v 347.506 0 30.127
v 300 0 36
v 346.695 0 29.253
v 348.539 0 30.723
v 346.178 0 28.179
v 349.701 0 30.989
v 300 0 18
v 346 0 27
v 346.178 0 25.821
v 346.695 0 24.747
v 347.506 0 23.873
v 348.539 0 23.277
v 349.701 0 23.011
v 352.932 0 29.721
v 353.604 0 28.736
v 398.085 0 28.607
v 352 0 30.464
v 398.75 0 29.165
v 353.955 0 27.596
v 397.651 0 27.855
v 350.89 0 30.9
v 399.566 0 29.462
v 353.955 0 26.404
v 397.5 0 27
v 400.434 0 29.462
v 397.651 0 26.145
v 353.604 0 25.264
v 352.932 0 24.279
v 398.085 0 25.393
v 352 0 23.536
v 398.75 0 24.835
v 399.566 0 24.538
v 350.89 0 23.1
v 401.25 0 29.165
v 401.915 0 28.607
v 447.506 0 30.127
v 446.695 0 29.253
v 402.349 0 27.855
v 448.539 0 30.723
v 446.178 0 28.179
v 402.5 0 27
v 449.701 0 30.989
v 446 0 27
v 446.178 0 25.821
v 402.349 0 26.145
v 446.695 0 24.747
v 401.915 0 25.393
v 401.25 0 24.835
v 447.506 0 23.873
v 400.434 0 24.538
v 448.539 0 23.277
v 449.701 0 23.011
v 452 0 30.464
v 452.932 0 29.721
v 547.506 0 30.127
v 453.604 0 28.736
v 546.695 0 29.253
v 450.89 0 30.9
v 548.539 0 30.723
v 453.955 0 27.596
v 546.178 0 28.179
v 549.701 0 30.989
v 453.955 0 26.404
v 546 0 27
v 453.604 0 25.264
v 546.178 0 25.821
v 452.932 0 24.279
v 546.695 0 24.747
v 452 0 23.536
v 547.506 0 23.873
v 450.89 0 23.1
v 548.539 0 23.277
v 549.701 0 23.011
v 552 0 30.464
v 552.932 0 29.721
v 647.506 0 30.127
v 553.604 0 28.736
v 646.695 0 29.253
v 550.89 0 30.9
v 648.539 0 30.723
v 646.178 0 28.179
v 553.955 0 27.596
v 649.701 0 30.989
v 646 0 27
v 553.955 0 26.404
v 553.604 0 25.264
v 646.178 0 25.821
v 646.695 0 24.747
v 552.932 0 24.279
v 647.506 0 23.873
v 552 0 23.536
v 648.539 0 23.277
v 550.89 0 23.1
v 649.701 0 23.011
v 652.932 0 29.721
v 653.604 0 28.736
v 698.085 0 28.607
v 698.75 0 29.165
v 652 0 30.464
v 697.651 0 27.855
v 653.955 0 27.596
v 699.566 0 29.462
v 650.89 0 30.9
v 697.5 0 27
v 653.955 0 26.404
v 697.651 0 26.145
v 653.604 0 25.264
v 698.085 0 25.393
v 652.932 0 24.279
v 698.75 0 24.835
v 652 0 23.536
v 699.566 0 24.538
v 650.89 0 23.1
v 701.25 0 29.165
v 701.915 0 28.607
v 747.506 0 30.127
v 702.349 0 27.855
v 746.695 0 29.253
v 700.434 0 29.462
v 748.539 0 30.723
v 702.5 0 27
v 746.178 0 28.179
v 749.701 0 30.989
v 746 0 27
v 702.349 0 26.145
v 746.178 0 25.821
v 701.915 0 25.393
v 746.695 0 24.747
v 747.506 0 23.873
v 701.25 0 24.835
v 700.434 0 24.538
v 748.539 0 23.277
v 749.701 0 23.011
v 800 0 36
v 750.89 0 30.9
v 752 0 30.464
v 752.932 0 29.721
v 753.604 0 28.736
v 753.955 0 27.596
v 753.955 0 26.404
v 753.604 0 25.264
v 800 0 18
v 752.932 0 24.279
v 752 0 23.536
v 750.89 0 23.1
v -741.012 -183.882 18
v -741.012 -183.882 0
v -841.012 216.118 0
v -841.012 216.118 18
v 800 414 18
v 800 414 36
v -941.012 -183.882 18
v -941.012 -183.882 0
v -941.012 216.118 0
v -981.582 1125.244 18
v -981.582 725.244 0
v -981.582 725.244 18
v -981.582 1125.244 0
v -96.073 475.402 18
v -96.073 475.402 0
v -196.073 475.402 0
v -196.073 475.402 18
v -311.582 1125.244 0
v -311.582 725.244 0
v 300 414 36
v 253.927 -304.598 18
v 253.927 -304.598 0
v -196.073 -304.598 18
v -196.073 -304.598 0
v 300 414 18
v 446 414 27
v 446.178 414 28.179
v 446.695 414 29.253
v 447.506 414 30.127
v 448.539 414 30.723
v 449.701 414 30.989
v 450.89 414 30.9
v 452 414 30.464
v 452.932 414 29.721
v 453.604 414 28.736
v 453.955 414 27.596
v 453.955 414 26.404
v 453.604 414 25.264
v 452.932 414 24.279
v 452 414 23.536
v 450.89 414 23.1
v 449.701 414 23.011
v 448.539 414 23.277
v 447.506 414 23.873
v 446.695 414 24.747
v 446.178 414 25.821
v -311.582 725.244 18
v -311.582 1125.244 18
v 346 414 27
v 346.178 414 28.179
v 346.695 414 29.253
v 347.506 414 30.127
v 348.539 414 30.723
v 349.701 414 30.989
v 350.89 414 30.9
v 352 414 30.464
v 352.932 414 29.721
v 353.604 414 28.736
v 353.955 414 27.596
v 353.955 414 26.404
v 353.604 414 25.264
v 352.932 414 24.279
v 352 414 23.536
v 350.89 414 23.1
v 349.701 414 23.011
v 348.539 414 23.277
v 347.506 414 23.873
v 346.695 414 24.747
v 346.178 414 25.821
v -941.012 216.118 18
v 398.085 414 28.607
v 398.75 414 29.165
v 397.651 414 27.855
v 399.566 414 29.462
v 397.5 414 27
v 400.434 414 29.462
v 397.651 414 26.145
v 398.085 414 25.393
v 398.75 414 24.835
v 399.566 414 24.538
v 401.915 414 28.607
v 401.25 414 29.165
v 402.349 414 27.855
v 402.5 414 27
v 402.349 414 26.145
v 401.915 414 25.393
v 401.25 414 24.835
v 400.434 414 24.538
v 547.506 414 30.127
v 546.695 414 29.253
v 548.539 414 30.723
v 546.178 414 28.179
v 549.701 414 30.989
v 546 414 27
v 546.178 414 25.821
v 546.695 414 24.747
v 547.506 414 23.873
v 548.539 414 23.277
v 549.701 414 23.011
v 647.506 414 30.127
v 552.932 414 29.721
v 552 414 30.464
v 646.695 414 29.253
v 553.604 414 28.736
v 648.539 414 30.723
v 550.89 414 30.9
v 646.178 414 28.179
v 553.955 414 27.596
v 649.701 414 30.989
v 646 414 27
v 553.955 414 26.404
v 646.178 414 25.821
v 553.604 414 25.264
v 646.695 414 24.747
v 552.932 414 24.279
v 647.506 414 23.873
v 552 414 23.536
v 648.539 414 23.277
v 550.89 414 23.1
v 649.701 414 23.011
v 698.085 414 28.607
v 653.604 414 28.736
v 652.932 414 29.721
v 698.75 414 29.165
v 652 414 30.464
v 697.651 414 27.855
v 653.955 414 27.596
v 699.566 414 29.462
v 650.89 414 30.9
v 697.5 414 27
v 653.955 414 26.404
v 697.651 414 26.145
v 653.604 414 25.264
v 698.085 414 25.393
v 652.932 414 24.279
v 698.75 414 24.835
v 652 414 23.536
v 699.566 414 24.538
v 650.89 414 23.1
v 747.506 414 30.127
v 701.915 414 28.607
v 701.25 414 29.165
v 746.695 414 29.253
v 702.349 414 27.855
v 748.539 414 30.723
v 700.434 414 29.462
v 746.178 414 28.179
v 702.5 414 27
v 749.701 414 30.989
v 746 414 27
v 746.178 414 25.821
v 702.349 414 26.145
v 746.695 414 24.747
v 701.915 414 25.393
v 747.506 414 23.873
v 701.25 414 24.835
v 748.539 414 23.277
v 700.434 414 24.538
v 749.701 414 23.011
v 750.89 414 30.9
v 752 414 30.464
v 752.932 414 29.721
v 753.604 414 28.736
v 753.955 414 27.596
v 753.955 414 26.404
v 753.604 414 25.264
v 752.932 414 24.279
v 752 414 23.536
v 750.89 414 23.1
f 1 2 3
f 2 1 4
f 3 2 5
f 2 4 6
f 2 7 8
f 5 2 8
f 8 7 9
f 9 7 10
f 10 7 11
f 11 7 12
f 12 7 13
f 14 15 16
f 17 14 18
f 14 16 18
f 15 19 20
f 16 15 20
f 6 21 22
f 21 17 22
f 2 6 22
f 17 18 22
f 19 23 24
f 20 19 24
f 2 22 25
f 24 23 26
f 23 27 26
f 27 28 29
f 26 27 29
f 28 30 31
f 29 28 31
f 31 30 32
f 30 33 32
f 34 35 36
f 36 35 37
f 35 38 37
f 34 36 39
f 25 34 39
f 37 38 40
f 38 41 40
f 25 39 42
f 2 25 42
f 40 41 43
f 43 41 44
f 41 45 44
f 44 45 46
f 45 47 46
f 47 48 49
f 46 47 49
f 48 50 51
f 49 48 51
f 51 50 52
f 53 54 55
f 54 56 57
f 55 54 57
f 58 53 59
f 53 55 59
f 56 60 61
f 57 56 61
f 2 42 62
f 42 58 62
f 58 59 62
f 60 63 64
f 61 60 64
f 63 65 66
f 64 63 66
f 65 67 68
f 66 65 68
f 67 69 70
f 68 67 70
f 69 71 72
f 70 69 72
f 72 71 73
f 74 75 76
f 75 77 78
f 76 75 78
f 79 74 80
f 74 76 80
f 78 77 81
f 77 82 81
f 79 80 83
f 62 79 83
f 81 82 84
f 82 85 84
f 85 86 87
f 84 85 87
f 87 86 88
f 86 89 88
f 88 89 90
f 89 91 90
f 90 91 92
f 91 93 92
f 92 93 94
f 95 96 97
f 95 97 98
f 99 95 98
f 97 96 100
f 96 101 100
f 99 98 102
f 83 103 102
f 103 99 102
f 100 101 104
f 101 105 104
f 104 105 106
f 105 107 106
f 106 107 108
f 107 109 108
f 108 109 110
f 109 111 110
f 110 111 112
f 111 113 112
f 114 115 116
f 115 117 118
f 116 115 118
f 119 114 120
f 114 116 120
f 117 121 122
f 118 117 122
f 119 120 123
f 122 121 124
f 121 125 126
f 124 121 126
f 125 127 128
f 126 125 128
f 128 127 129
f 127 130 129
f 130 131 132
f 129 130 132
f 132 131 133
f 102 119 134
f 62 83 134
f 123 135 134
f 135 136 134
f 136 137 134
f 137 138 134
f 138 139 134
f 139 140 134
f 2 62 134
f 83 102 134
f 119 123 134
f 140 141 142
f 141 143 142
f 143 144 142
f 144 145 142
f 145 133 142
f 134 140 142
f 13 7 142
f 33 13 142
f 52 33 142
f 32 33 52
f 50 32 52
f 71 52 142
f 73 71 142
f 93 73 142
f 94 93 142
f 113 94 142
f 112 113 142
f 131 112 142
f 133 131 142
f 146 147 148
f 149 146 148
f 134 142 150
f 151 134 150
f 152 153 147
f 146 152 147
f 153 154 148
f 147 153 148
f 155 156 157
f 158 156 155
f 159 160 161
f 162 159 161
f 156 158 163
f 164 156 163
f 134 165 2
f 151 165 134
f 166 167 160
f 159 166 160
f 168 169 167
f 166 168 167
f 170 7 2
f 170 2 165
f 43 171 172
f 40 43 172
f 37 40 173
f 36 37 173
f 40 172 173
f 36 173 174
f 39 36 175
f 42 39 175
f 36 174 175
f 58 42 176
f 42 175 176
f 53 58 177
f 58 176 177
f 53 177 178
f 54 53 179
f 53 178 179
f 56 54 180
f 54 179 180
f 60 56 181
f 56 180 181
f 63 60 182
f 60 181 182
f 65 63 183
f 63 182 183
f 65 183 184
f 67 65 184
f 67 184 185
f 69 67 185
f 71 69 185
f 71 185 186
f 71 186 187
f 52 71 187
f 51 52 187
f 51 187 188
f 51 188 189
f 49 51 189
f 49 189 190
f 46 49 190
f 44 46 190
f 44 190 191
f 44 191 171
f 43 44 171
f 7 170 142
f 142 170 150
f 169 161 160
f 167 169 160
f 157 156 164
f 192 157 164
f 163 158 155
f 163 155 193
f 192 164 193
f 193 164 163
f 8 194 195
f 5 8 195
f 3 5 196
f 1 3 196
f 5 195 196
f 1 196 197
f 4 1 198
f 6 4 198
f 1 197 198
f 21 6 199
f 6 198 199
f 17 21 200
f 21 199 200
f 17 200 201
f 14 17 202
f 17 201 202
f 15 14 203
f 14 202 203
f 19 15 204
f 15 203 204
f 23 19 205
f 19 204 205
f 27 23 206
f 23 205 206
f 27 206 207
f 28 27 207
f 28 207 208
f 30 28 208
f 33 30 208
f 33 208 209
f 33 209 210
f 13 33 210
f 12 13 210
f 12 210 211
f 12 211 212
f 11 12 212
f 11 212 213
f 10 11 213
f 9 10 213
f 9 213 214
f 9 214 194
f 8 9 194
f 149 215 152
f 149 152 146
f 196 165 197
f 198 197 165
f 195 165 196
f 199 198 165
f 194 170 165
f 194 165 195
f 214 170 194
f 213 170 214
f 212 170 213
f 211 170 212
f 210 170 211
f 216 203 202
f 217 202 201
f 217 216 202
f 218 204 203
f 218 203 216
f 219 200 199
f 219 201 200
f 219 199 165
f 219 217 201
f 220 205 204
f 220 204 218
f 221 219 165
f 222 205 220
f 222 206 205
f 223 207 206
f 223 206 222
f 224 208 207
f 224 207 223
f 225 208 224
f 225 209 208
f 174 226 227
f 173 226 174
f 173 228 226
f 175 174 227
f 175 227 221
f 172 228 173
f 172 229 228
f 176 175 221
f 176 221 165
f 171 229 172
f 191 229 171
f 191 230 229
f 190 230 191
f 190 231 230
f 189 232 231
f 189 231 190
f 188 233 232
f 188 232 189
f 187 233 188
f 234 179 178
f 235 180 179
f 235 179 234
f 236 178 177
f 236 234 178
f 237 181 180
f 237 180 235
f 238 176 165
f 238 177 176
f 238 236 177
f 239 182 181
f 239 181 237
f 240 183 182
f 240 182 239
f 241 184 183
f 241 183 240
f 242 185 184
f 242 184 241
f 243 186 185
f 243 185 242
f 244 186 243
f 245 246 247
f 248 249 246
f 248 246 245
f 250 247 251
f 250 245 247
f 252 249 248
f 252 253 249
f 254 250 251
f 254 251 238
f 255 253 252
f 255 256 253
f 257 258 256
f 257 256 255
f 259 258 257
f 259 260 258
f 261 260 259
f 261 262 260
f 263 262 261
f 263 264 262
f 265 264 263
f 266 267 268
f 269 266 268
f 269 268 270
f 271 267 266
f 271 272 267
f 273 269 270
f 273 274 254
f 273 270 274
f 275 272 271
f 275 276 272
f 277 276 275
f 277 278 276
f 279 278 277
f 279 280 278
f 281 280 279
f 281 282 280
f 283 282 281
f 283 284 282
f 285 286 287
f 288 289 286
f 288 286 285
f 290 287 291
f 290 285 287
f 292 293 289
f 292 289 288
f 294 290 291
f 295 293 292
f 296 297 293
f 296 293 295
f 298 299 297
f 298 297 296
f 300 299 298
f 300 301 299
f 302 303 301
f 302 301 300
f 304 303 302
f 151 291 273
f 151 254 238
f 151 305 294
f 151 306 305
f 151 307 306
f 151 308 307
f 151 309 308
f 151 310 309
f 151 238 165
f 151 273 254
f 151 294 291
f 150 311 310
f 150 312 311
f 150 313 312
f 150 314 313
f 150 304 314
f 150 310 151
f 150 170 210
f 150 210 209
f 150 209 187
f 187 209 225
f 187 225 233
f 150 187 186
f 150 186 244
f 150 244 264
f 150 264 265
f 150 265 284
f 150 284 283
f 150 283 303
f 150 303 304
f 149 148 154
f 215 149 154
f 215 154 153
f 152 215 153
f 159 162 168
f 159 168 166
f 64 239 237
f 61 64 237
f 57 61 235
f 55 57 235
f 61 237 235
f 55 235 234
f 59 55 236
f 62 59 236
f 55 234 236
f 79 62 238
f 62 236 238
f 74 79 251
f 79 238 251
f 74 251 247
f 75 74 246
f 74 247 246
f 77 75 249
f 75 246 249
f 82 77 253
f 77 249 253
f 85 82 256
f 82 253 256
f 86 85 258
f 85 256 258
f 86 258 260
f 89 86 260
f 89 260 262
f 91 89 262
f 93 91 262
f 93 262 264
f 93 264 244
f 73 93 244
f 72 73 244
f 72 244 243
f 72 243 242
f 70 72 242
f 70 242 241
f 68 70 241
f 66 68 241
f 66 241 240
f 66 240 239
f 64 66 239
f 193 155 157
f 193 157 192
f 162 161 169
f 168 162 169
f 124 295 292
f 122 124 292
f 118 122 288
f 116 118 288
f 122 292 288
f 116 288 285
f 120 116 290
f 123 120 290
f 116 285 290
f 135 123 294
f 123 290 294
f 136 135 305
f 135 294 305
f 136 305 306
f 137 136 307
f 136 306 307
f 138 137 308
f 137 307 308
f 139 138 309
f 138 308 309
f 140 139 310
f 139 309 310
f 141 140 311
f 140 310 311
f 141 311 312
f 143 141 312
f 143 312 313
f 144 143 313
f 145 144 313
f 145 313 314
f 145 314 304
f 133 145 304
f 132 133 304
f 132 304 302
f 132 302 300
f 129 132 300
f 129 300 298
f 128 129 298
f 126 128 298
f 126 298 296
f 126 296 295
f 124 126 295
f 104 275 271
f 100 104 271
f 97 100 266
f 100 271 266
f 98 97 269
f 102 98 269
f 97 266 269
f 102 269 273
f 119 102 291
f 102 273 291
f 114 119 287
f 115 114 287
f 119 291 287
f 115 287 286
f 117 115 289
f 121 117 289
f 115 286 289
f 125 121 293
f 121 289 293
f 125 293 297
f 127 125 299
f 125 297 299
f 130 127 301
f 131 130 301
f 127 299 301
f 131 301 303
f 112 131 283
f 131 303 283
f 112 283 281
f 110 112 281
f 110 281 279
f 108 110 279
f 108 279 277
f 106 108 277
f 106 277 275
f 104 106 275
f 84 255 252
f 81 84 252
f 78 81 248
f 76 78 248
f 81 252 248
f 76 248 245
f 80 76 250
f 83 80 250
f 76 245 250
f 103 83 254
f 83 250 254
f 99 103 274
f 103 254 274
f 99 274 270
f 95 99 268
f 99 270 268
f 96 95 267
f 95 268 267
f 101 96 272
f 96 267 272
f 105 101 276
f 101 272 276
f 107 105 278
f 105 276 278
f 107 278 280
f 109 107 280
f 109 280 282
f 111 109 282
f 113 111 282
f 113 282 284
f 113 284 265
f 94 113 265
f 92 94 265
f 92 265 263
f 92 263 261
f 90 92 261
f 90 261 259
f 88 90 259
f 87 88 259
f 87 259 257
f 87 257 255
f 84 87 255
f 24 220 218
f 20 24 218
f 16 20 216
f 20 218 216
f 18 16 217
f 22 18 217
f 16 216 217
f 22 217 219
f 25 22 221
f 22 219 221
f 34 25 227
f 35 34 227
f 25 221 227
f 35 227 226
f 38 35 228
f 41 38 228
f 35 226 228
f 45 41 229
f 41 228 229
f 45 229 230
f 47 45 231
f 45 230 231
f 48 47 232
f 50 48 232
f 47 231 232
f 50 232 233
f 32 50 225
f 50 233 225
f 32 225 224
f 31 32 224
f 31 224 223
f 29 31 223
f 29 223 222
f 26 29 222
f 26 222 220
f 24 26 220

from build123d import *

# Parameters (mm, degrees)
F1_DEPTH  = 18
F2_W      = 500
F2_H      = 414
F3_DEPTH  = 18
F4_DEPTH  = 18
F6_D      = 8
F8_DEPTH  = 18
F9_W      = 670
F9_H      = 400
F10_DEPTH = 18
F11_D     = 5


with BuildPart() as f1:
    # F0 (on Top) → F1 (new body)
    with BuildSketch(Plane.XY):
        Polygon((-196.072614, 475.402147), (-196.072614, -304.597853), (253.927386, -304.597853), (-96.072614, 475.402147), align=None)
    extrude(amount=F1_DEPTH)


with BuildPart() as f3:
    # F2 (on face) → F3 (new body)
    with BuildSketch(Plane.XY.offset(18)):
        with Locations((550, 207)):
            Rectangle(F2_W, F2_H)
    extrude(amount=F3_DEPTH)

    # F2 (on face) → F4 (join)
    with BuildSketch(Plane.XY.offset(18)):
        with Locations((550, 207)):
            Rectangle(F2_W, F2_H)
    extrude(amount=F4_DEPTH)

    # F6 (through all)
    with Locations(Plane.XZ):
        with Locations((350, 27), (450, 27), (550, 27), (650, 27), (750, 27)):
            Hole(F6_D / 2)

    # F11 (through all)
    with Locations(Plane.XZ):
        with Locations((400, 27), (700, 27)):
            Hole(F11_D / 2)


with BuildPart() as f8:
    # F7 (on Top) → F8 (new body)
    with BuildSketch(Plane.XY):
        Polygon((-941.011737, 216.118392), (-941.011737, -183.881608), (-741.011737, -183.881608), (-841.011737, 216.118392), align=None)
    extrude(amount=F8_DEPTH)


with BuildPart() as f10:
    # F9 (on Top) → F10 (new body)
    with BuildSketch(Plane.XY):
        with Locations((-646.582007, 925.243556)):
            Rectangle(F9_W, F9_H)
    extrude(amount=F10_DEPTH)


solid = Compound([f1.part, f3.part, f8.part, f10.part])
